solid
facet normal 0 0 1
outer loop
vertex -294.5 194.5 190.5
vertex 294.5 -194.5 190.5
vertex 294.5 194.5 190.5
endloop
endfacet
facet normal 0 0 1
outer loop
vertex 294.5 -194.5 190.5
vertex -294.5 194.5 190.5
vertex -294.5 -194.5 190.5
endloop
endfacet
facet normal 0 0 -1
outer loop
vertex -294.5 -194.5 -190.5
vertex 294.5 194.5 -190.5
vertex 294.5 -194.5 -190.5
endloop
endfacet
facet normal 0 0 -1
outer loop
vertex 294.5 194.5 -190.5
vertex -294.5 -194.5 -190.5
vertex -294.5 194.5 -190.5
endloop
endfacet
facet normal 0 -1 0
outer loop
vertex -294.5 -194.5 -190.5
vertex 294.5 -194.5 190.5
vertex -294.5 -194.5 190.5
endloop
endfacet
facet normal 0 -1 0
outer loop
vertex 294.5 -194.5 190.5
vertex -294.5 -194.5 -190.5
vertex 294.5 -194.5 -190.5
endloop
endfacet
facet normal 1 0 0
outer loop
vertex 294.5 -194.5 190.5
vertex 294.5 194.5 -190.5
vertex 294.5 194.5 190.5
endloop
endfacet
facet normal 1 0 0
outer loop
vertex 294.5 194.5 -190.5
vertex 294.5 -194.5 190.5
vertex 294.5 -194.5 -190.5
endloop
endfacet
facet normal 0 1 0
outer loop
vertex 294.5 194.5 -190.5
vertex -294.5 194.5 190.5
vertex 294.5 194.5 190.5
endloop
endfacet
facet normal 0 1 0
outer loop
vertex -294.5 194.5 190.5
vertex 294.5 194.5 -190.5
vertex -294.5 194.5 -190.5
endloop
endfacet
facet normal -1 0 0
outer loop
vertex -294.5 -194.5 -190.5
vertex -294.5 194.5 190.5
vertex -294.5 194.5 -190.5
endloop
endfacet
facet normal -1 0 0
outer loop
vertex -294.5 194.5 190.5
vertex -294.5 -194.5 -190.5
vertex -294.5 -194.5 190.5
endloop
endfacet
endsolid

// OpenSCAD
x = 589;
y = 389;
z = 381;

color("#455f48")
cube([x,y,z], center = true);
